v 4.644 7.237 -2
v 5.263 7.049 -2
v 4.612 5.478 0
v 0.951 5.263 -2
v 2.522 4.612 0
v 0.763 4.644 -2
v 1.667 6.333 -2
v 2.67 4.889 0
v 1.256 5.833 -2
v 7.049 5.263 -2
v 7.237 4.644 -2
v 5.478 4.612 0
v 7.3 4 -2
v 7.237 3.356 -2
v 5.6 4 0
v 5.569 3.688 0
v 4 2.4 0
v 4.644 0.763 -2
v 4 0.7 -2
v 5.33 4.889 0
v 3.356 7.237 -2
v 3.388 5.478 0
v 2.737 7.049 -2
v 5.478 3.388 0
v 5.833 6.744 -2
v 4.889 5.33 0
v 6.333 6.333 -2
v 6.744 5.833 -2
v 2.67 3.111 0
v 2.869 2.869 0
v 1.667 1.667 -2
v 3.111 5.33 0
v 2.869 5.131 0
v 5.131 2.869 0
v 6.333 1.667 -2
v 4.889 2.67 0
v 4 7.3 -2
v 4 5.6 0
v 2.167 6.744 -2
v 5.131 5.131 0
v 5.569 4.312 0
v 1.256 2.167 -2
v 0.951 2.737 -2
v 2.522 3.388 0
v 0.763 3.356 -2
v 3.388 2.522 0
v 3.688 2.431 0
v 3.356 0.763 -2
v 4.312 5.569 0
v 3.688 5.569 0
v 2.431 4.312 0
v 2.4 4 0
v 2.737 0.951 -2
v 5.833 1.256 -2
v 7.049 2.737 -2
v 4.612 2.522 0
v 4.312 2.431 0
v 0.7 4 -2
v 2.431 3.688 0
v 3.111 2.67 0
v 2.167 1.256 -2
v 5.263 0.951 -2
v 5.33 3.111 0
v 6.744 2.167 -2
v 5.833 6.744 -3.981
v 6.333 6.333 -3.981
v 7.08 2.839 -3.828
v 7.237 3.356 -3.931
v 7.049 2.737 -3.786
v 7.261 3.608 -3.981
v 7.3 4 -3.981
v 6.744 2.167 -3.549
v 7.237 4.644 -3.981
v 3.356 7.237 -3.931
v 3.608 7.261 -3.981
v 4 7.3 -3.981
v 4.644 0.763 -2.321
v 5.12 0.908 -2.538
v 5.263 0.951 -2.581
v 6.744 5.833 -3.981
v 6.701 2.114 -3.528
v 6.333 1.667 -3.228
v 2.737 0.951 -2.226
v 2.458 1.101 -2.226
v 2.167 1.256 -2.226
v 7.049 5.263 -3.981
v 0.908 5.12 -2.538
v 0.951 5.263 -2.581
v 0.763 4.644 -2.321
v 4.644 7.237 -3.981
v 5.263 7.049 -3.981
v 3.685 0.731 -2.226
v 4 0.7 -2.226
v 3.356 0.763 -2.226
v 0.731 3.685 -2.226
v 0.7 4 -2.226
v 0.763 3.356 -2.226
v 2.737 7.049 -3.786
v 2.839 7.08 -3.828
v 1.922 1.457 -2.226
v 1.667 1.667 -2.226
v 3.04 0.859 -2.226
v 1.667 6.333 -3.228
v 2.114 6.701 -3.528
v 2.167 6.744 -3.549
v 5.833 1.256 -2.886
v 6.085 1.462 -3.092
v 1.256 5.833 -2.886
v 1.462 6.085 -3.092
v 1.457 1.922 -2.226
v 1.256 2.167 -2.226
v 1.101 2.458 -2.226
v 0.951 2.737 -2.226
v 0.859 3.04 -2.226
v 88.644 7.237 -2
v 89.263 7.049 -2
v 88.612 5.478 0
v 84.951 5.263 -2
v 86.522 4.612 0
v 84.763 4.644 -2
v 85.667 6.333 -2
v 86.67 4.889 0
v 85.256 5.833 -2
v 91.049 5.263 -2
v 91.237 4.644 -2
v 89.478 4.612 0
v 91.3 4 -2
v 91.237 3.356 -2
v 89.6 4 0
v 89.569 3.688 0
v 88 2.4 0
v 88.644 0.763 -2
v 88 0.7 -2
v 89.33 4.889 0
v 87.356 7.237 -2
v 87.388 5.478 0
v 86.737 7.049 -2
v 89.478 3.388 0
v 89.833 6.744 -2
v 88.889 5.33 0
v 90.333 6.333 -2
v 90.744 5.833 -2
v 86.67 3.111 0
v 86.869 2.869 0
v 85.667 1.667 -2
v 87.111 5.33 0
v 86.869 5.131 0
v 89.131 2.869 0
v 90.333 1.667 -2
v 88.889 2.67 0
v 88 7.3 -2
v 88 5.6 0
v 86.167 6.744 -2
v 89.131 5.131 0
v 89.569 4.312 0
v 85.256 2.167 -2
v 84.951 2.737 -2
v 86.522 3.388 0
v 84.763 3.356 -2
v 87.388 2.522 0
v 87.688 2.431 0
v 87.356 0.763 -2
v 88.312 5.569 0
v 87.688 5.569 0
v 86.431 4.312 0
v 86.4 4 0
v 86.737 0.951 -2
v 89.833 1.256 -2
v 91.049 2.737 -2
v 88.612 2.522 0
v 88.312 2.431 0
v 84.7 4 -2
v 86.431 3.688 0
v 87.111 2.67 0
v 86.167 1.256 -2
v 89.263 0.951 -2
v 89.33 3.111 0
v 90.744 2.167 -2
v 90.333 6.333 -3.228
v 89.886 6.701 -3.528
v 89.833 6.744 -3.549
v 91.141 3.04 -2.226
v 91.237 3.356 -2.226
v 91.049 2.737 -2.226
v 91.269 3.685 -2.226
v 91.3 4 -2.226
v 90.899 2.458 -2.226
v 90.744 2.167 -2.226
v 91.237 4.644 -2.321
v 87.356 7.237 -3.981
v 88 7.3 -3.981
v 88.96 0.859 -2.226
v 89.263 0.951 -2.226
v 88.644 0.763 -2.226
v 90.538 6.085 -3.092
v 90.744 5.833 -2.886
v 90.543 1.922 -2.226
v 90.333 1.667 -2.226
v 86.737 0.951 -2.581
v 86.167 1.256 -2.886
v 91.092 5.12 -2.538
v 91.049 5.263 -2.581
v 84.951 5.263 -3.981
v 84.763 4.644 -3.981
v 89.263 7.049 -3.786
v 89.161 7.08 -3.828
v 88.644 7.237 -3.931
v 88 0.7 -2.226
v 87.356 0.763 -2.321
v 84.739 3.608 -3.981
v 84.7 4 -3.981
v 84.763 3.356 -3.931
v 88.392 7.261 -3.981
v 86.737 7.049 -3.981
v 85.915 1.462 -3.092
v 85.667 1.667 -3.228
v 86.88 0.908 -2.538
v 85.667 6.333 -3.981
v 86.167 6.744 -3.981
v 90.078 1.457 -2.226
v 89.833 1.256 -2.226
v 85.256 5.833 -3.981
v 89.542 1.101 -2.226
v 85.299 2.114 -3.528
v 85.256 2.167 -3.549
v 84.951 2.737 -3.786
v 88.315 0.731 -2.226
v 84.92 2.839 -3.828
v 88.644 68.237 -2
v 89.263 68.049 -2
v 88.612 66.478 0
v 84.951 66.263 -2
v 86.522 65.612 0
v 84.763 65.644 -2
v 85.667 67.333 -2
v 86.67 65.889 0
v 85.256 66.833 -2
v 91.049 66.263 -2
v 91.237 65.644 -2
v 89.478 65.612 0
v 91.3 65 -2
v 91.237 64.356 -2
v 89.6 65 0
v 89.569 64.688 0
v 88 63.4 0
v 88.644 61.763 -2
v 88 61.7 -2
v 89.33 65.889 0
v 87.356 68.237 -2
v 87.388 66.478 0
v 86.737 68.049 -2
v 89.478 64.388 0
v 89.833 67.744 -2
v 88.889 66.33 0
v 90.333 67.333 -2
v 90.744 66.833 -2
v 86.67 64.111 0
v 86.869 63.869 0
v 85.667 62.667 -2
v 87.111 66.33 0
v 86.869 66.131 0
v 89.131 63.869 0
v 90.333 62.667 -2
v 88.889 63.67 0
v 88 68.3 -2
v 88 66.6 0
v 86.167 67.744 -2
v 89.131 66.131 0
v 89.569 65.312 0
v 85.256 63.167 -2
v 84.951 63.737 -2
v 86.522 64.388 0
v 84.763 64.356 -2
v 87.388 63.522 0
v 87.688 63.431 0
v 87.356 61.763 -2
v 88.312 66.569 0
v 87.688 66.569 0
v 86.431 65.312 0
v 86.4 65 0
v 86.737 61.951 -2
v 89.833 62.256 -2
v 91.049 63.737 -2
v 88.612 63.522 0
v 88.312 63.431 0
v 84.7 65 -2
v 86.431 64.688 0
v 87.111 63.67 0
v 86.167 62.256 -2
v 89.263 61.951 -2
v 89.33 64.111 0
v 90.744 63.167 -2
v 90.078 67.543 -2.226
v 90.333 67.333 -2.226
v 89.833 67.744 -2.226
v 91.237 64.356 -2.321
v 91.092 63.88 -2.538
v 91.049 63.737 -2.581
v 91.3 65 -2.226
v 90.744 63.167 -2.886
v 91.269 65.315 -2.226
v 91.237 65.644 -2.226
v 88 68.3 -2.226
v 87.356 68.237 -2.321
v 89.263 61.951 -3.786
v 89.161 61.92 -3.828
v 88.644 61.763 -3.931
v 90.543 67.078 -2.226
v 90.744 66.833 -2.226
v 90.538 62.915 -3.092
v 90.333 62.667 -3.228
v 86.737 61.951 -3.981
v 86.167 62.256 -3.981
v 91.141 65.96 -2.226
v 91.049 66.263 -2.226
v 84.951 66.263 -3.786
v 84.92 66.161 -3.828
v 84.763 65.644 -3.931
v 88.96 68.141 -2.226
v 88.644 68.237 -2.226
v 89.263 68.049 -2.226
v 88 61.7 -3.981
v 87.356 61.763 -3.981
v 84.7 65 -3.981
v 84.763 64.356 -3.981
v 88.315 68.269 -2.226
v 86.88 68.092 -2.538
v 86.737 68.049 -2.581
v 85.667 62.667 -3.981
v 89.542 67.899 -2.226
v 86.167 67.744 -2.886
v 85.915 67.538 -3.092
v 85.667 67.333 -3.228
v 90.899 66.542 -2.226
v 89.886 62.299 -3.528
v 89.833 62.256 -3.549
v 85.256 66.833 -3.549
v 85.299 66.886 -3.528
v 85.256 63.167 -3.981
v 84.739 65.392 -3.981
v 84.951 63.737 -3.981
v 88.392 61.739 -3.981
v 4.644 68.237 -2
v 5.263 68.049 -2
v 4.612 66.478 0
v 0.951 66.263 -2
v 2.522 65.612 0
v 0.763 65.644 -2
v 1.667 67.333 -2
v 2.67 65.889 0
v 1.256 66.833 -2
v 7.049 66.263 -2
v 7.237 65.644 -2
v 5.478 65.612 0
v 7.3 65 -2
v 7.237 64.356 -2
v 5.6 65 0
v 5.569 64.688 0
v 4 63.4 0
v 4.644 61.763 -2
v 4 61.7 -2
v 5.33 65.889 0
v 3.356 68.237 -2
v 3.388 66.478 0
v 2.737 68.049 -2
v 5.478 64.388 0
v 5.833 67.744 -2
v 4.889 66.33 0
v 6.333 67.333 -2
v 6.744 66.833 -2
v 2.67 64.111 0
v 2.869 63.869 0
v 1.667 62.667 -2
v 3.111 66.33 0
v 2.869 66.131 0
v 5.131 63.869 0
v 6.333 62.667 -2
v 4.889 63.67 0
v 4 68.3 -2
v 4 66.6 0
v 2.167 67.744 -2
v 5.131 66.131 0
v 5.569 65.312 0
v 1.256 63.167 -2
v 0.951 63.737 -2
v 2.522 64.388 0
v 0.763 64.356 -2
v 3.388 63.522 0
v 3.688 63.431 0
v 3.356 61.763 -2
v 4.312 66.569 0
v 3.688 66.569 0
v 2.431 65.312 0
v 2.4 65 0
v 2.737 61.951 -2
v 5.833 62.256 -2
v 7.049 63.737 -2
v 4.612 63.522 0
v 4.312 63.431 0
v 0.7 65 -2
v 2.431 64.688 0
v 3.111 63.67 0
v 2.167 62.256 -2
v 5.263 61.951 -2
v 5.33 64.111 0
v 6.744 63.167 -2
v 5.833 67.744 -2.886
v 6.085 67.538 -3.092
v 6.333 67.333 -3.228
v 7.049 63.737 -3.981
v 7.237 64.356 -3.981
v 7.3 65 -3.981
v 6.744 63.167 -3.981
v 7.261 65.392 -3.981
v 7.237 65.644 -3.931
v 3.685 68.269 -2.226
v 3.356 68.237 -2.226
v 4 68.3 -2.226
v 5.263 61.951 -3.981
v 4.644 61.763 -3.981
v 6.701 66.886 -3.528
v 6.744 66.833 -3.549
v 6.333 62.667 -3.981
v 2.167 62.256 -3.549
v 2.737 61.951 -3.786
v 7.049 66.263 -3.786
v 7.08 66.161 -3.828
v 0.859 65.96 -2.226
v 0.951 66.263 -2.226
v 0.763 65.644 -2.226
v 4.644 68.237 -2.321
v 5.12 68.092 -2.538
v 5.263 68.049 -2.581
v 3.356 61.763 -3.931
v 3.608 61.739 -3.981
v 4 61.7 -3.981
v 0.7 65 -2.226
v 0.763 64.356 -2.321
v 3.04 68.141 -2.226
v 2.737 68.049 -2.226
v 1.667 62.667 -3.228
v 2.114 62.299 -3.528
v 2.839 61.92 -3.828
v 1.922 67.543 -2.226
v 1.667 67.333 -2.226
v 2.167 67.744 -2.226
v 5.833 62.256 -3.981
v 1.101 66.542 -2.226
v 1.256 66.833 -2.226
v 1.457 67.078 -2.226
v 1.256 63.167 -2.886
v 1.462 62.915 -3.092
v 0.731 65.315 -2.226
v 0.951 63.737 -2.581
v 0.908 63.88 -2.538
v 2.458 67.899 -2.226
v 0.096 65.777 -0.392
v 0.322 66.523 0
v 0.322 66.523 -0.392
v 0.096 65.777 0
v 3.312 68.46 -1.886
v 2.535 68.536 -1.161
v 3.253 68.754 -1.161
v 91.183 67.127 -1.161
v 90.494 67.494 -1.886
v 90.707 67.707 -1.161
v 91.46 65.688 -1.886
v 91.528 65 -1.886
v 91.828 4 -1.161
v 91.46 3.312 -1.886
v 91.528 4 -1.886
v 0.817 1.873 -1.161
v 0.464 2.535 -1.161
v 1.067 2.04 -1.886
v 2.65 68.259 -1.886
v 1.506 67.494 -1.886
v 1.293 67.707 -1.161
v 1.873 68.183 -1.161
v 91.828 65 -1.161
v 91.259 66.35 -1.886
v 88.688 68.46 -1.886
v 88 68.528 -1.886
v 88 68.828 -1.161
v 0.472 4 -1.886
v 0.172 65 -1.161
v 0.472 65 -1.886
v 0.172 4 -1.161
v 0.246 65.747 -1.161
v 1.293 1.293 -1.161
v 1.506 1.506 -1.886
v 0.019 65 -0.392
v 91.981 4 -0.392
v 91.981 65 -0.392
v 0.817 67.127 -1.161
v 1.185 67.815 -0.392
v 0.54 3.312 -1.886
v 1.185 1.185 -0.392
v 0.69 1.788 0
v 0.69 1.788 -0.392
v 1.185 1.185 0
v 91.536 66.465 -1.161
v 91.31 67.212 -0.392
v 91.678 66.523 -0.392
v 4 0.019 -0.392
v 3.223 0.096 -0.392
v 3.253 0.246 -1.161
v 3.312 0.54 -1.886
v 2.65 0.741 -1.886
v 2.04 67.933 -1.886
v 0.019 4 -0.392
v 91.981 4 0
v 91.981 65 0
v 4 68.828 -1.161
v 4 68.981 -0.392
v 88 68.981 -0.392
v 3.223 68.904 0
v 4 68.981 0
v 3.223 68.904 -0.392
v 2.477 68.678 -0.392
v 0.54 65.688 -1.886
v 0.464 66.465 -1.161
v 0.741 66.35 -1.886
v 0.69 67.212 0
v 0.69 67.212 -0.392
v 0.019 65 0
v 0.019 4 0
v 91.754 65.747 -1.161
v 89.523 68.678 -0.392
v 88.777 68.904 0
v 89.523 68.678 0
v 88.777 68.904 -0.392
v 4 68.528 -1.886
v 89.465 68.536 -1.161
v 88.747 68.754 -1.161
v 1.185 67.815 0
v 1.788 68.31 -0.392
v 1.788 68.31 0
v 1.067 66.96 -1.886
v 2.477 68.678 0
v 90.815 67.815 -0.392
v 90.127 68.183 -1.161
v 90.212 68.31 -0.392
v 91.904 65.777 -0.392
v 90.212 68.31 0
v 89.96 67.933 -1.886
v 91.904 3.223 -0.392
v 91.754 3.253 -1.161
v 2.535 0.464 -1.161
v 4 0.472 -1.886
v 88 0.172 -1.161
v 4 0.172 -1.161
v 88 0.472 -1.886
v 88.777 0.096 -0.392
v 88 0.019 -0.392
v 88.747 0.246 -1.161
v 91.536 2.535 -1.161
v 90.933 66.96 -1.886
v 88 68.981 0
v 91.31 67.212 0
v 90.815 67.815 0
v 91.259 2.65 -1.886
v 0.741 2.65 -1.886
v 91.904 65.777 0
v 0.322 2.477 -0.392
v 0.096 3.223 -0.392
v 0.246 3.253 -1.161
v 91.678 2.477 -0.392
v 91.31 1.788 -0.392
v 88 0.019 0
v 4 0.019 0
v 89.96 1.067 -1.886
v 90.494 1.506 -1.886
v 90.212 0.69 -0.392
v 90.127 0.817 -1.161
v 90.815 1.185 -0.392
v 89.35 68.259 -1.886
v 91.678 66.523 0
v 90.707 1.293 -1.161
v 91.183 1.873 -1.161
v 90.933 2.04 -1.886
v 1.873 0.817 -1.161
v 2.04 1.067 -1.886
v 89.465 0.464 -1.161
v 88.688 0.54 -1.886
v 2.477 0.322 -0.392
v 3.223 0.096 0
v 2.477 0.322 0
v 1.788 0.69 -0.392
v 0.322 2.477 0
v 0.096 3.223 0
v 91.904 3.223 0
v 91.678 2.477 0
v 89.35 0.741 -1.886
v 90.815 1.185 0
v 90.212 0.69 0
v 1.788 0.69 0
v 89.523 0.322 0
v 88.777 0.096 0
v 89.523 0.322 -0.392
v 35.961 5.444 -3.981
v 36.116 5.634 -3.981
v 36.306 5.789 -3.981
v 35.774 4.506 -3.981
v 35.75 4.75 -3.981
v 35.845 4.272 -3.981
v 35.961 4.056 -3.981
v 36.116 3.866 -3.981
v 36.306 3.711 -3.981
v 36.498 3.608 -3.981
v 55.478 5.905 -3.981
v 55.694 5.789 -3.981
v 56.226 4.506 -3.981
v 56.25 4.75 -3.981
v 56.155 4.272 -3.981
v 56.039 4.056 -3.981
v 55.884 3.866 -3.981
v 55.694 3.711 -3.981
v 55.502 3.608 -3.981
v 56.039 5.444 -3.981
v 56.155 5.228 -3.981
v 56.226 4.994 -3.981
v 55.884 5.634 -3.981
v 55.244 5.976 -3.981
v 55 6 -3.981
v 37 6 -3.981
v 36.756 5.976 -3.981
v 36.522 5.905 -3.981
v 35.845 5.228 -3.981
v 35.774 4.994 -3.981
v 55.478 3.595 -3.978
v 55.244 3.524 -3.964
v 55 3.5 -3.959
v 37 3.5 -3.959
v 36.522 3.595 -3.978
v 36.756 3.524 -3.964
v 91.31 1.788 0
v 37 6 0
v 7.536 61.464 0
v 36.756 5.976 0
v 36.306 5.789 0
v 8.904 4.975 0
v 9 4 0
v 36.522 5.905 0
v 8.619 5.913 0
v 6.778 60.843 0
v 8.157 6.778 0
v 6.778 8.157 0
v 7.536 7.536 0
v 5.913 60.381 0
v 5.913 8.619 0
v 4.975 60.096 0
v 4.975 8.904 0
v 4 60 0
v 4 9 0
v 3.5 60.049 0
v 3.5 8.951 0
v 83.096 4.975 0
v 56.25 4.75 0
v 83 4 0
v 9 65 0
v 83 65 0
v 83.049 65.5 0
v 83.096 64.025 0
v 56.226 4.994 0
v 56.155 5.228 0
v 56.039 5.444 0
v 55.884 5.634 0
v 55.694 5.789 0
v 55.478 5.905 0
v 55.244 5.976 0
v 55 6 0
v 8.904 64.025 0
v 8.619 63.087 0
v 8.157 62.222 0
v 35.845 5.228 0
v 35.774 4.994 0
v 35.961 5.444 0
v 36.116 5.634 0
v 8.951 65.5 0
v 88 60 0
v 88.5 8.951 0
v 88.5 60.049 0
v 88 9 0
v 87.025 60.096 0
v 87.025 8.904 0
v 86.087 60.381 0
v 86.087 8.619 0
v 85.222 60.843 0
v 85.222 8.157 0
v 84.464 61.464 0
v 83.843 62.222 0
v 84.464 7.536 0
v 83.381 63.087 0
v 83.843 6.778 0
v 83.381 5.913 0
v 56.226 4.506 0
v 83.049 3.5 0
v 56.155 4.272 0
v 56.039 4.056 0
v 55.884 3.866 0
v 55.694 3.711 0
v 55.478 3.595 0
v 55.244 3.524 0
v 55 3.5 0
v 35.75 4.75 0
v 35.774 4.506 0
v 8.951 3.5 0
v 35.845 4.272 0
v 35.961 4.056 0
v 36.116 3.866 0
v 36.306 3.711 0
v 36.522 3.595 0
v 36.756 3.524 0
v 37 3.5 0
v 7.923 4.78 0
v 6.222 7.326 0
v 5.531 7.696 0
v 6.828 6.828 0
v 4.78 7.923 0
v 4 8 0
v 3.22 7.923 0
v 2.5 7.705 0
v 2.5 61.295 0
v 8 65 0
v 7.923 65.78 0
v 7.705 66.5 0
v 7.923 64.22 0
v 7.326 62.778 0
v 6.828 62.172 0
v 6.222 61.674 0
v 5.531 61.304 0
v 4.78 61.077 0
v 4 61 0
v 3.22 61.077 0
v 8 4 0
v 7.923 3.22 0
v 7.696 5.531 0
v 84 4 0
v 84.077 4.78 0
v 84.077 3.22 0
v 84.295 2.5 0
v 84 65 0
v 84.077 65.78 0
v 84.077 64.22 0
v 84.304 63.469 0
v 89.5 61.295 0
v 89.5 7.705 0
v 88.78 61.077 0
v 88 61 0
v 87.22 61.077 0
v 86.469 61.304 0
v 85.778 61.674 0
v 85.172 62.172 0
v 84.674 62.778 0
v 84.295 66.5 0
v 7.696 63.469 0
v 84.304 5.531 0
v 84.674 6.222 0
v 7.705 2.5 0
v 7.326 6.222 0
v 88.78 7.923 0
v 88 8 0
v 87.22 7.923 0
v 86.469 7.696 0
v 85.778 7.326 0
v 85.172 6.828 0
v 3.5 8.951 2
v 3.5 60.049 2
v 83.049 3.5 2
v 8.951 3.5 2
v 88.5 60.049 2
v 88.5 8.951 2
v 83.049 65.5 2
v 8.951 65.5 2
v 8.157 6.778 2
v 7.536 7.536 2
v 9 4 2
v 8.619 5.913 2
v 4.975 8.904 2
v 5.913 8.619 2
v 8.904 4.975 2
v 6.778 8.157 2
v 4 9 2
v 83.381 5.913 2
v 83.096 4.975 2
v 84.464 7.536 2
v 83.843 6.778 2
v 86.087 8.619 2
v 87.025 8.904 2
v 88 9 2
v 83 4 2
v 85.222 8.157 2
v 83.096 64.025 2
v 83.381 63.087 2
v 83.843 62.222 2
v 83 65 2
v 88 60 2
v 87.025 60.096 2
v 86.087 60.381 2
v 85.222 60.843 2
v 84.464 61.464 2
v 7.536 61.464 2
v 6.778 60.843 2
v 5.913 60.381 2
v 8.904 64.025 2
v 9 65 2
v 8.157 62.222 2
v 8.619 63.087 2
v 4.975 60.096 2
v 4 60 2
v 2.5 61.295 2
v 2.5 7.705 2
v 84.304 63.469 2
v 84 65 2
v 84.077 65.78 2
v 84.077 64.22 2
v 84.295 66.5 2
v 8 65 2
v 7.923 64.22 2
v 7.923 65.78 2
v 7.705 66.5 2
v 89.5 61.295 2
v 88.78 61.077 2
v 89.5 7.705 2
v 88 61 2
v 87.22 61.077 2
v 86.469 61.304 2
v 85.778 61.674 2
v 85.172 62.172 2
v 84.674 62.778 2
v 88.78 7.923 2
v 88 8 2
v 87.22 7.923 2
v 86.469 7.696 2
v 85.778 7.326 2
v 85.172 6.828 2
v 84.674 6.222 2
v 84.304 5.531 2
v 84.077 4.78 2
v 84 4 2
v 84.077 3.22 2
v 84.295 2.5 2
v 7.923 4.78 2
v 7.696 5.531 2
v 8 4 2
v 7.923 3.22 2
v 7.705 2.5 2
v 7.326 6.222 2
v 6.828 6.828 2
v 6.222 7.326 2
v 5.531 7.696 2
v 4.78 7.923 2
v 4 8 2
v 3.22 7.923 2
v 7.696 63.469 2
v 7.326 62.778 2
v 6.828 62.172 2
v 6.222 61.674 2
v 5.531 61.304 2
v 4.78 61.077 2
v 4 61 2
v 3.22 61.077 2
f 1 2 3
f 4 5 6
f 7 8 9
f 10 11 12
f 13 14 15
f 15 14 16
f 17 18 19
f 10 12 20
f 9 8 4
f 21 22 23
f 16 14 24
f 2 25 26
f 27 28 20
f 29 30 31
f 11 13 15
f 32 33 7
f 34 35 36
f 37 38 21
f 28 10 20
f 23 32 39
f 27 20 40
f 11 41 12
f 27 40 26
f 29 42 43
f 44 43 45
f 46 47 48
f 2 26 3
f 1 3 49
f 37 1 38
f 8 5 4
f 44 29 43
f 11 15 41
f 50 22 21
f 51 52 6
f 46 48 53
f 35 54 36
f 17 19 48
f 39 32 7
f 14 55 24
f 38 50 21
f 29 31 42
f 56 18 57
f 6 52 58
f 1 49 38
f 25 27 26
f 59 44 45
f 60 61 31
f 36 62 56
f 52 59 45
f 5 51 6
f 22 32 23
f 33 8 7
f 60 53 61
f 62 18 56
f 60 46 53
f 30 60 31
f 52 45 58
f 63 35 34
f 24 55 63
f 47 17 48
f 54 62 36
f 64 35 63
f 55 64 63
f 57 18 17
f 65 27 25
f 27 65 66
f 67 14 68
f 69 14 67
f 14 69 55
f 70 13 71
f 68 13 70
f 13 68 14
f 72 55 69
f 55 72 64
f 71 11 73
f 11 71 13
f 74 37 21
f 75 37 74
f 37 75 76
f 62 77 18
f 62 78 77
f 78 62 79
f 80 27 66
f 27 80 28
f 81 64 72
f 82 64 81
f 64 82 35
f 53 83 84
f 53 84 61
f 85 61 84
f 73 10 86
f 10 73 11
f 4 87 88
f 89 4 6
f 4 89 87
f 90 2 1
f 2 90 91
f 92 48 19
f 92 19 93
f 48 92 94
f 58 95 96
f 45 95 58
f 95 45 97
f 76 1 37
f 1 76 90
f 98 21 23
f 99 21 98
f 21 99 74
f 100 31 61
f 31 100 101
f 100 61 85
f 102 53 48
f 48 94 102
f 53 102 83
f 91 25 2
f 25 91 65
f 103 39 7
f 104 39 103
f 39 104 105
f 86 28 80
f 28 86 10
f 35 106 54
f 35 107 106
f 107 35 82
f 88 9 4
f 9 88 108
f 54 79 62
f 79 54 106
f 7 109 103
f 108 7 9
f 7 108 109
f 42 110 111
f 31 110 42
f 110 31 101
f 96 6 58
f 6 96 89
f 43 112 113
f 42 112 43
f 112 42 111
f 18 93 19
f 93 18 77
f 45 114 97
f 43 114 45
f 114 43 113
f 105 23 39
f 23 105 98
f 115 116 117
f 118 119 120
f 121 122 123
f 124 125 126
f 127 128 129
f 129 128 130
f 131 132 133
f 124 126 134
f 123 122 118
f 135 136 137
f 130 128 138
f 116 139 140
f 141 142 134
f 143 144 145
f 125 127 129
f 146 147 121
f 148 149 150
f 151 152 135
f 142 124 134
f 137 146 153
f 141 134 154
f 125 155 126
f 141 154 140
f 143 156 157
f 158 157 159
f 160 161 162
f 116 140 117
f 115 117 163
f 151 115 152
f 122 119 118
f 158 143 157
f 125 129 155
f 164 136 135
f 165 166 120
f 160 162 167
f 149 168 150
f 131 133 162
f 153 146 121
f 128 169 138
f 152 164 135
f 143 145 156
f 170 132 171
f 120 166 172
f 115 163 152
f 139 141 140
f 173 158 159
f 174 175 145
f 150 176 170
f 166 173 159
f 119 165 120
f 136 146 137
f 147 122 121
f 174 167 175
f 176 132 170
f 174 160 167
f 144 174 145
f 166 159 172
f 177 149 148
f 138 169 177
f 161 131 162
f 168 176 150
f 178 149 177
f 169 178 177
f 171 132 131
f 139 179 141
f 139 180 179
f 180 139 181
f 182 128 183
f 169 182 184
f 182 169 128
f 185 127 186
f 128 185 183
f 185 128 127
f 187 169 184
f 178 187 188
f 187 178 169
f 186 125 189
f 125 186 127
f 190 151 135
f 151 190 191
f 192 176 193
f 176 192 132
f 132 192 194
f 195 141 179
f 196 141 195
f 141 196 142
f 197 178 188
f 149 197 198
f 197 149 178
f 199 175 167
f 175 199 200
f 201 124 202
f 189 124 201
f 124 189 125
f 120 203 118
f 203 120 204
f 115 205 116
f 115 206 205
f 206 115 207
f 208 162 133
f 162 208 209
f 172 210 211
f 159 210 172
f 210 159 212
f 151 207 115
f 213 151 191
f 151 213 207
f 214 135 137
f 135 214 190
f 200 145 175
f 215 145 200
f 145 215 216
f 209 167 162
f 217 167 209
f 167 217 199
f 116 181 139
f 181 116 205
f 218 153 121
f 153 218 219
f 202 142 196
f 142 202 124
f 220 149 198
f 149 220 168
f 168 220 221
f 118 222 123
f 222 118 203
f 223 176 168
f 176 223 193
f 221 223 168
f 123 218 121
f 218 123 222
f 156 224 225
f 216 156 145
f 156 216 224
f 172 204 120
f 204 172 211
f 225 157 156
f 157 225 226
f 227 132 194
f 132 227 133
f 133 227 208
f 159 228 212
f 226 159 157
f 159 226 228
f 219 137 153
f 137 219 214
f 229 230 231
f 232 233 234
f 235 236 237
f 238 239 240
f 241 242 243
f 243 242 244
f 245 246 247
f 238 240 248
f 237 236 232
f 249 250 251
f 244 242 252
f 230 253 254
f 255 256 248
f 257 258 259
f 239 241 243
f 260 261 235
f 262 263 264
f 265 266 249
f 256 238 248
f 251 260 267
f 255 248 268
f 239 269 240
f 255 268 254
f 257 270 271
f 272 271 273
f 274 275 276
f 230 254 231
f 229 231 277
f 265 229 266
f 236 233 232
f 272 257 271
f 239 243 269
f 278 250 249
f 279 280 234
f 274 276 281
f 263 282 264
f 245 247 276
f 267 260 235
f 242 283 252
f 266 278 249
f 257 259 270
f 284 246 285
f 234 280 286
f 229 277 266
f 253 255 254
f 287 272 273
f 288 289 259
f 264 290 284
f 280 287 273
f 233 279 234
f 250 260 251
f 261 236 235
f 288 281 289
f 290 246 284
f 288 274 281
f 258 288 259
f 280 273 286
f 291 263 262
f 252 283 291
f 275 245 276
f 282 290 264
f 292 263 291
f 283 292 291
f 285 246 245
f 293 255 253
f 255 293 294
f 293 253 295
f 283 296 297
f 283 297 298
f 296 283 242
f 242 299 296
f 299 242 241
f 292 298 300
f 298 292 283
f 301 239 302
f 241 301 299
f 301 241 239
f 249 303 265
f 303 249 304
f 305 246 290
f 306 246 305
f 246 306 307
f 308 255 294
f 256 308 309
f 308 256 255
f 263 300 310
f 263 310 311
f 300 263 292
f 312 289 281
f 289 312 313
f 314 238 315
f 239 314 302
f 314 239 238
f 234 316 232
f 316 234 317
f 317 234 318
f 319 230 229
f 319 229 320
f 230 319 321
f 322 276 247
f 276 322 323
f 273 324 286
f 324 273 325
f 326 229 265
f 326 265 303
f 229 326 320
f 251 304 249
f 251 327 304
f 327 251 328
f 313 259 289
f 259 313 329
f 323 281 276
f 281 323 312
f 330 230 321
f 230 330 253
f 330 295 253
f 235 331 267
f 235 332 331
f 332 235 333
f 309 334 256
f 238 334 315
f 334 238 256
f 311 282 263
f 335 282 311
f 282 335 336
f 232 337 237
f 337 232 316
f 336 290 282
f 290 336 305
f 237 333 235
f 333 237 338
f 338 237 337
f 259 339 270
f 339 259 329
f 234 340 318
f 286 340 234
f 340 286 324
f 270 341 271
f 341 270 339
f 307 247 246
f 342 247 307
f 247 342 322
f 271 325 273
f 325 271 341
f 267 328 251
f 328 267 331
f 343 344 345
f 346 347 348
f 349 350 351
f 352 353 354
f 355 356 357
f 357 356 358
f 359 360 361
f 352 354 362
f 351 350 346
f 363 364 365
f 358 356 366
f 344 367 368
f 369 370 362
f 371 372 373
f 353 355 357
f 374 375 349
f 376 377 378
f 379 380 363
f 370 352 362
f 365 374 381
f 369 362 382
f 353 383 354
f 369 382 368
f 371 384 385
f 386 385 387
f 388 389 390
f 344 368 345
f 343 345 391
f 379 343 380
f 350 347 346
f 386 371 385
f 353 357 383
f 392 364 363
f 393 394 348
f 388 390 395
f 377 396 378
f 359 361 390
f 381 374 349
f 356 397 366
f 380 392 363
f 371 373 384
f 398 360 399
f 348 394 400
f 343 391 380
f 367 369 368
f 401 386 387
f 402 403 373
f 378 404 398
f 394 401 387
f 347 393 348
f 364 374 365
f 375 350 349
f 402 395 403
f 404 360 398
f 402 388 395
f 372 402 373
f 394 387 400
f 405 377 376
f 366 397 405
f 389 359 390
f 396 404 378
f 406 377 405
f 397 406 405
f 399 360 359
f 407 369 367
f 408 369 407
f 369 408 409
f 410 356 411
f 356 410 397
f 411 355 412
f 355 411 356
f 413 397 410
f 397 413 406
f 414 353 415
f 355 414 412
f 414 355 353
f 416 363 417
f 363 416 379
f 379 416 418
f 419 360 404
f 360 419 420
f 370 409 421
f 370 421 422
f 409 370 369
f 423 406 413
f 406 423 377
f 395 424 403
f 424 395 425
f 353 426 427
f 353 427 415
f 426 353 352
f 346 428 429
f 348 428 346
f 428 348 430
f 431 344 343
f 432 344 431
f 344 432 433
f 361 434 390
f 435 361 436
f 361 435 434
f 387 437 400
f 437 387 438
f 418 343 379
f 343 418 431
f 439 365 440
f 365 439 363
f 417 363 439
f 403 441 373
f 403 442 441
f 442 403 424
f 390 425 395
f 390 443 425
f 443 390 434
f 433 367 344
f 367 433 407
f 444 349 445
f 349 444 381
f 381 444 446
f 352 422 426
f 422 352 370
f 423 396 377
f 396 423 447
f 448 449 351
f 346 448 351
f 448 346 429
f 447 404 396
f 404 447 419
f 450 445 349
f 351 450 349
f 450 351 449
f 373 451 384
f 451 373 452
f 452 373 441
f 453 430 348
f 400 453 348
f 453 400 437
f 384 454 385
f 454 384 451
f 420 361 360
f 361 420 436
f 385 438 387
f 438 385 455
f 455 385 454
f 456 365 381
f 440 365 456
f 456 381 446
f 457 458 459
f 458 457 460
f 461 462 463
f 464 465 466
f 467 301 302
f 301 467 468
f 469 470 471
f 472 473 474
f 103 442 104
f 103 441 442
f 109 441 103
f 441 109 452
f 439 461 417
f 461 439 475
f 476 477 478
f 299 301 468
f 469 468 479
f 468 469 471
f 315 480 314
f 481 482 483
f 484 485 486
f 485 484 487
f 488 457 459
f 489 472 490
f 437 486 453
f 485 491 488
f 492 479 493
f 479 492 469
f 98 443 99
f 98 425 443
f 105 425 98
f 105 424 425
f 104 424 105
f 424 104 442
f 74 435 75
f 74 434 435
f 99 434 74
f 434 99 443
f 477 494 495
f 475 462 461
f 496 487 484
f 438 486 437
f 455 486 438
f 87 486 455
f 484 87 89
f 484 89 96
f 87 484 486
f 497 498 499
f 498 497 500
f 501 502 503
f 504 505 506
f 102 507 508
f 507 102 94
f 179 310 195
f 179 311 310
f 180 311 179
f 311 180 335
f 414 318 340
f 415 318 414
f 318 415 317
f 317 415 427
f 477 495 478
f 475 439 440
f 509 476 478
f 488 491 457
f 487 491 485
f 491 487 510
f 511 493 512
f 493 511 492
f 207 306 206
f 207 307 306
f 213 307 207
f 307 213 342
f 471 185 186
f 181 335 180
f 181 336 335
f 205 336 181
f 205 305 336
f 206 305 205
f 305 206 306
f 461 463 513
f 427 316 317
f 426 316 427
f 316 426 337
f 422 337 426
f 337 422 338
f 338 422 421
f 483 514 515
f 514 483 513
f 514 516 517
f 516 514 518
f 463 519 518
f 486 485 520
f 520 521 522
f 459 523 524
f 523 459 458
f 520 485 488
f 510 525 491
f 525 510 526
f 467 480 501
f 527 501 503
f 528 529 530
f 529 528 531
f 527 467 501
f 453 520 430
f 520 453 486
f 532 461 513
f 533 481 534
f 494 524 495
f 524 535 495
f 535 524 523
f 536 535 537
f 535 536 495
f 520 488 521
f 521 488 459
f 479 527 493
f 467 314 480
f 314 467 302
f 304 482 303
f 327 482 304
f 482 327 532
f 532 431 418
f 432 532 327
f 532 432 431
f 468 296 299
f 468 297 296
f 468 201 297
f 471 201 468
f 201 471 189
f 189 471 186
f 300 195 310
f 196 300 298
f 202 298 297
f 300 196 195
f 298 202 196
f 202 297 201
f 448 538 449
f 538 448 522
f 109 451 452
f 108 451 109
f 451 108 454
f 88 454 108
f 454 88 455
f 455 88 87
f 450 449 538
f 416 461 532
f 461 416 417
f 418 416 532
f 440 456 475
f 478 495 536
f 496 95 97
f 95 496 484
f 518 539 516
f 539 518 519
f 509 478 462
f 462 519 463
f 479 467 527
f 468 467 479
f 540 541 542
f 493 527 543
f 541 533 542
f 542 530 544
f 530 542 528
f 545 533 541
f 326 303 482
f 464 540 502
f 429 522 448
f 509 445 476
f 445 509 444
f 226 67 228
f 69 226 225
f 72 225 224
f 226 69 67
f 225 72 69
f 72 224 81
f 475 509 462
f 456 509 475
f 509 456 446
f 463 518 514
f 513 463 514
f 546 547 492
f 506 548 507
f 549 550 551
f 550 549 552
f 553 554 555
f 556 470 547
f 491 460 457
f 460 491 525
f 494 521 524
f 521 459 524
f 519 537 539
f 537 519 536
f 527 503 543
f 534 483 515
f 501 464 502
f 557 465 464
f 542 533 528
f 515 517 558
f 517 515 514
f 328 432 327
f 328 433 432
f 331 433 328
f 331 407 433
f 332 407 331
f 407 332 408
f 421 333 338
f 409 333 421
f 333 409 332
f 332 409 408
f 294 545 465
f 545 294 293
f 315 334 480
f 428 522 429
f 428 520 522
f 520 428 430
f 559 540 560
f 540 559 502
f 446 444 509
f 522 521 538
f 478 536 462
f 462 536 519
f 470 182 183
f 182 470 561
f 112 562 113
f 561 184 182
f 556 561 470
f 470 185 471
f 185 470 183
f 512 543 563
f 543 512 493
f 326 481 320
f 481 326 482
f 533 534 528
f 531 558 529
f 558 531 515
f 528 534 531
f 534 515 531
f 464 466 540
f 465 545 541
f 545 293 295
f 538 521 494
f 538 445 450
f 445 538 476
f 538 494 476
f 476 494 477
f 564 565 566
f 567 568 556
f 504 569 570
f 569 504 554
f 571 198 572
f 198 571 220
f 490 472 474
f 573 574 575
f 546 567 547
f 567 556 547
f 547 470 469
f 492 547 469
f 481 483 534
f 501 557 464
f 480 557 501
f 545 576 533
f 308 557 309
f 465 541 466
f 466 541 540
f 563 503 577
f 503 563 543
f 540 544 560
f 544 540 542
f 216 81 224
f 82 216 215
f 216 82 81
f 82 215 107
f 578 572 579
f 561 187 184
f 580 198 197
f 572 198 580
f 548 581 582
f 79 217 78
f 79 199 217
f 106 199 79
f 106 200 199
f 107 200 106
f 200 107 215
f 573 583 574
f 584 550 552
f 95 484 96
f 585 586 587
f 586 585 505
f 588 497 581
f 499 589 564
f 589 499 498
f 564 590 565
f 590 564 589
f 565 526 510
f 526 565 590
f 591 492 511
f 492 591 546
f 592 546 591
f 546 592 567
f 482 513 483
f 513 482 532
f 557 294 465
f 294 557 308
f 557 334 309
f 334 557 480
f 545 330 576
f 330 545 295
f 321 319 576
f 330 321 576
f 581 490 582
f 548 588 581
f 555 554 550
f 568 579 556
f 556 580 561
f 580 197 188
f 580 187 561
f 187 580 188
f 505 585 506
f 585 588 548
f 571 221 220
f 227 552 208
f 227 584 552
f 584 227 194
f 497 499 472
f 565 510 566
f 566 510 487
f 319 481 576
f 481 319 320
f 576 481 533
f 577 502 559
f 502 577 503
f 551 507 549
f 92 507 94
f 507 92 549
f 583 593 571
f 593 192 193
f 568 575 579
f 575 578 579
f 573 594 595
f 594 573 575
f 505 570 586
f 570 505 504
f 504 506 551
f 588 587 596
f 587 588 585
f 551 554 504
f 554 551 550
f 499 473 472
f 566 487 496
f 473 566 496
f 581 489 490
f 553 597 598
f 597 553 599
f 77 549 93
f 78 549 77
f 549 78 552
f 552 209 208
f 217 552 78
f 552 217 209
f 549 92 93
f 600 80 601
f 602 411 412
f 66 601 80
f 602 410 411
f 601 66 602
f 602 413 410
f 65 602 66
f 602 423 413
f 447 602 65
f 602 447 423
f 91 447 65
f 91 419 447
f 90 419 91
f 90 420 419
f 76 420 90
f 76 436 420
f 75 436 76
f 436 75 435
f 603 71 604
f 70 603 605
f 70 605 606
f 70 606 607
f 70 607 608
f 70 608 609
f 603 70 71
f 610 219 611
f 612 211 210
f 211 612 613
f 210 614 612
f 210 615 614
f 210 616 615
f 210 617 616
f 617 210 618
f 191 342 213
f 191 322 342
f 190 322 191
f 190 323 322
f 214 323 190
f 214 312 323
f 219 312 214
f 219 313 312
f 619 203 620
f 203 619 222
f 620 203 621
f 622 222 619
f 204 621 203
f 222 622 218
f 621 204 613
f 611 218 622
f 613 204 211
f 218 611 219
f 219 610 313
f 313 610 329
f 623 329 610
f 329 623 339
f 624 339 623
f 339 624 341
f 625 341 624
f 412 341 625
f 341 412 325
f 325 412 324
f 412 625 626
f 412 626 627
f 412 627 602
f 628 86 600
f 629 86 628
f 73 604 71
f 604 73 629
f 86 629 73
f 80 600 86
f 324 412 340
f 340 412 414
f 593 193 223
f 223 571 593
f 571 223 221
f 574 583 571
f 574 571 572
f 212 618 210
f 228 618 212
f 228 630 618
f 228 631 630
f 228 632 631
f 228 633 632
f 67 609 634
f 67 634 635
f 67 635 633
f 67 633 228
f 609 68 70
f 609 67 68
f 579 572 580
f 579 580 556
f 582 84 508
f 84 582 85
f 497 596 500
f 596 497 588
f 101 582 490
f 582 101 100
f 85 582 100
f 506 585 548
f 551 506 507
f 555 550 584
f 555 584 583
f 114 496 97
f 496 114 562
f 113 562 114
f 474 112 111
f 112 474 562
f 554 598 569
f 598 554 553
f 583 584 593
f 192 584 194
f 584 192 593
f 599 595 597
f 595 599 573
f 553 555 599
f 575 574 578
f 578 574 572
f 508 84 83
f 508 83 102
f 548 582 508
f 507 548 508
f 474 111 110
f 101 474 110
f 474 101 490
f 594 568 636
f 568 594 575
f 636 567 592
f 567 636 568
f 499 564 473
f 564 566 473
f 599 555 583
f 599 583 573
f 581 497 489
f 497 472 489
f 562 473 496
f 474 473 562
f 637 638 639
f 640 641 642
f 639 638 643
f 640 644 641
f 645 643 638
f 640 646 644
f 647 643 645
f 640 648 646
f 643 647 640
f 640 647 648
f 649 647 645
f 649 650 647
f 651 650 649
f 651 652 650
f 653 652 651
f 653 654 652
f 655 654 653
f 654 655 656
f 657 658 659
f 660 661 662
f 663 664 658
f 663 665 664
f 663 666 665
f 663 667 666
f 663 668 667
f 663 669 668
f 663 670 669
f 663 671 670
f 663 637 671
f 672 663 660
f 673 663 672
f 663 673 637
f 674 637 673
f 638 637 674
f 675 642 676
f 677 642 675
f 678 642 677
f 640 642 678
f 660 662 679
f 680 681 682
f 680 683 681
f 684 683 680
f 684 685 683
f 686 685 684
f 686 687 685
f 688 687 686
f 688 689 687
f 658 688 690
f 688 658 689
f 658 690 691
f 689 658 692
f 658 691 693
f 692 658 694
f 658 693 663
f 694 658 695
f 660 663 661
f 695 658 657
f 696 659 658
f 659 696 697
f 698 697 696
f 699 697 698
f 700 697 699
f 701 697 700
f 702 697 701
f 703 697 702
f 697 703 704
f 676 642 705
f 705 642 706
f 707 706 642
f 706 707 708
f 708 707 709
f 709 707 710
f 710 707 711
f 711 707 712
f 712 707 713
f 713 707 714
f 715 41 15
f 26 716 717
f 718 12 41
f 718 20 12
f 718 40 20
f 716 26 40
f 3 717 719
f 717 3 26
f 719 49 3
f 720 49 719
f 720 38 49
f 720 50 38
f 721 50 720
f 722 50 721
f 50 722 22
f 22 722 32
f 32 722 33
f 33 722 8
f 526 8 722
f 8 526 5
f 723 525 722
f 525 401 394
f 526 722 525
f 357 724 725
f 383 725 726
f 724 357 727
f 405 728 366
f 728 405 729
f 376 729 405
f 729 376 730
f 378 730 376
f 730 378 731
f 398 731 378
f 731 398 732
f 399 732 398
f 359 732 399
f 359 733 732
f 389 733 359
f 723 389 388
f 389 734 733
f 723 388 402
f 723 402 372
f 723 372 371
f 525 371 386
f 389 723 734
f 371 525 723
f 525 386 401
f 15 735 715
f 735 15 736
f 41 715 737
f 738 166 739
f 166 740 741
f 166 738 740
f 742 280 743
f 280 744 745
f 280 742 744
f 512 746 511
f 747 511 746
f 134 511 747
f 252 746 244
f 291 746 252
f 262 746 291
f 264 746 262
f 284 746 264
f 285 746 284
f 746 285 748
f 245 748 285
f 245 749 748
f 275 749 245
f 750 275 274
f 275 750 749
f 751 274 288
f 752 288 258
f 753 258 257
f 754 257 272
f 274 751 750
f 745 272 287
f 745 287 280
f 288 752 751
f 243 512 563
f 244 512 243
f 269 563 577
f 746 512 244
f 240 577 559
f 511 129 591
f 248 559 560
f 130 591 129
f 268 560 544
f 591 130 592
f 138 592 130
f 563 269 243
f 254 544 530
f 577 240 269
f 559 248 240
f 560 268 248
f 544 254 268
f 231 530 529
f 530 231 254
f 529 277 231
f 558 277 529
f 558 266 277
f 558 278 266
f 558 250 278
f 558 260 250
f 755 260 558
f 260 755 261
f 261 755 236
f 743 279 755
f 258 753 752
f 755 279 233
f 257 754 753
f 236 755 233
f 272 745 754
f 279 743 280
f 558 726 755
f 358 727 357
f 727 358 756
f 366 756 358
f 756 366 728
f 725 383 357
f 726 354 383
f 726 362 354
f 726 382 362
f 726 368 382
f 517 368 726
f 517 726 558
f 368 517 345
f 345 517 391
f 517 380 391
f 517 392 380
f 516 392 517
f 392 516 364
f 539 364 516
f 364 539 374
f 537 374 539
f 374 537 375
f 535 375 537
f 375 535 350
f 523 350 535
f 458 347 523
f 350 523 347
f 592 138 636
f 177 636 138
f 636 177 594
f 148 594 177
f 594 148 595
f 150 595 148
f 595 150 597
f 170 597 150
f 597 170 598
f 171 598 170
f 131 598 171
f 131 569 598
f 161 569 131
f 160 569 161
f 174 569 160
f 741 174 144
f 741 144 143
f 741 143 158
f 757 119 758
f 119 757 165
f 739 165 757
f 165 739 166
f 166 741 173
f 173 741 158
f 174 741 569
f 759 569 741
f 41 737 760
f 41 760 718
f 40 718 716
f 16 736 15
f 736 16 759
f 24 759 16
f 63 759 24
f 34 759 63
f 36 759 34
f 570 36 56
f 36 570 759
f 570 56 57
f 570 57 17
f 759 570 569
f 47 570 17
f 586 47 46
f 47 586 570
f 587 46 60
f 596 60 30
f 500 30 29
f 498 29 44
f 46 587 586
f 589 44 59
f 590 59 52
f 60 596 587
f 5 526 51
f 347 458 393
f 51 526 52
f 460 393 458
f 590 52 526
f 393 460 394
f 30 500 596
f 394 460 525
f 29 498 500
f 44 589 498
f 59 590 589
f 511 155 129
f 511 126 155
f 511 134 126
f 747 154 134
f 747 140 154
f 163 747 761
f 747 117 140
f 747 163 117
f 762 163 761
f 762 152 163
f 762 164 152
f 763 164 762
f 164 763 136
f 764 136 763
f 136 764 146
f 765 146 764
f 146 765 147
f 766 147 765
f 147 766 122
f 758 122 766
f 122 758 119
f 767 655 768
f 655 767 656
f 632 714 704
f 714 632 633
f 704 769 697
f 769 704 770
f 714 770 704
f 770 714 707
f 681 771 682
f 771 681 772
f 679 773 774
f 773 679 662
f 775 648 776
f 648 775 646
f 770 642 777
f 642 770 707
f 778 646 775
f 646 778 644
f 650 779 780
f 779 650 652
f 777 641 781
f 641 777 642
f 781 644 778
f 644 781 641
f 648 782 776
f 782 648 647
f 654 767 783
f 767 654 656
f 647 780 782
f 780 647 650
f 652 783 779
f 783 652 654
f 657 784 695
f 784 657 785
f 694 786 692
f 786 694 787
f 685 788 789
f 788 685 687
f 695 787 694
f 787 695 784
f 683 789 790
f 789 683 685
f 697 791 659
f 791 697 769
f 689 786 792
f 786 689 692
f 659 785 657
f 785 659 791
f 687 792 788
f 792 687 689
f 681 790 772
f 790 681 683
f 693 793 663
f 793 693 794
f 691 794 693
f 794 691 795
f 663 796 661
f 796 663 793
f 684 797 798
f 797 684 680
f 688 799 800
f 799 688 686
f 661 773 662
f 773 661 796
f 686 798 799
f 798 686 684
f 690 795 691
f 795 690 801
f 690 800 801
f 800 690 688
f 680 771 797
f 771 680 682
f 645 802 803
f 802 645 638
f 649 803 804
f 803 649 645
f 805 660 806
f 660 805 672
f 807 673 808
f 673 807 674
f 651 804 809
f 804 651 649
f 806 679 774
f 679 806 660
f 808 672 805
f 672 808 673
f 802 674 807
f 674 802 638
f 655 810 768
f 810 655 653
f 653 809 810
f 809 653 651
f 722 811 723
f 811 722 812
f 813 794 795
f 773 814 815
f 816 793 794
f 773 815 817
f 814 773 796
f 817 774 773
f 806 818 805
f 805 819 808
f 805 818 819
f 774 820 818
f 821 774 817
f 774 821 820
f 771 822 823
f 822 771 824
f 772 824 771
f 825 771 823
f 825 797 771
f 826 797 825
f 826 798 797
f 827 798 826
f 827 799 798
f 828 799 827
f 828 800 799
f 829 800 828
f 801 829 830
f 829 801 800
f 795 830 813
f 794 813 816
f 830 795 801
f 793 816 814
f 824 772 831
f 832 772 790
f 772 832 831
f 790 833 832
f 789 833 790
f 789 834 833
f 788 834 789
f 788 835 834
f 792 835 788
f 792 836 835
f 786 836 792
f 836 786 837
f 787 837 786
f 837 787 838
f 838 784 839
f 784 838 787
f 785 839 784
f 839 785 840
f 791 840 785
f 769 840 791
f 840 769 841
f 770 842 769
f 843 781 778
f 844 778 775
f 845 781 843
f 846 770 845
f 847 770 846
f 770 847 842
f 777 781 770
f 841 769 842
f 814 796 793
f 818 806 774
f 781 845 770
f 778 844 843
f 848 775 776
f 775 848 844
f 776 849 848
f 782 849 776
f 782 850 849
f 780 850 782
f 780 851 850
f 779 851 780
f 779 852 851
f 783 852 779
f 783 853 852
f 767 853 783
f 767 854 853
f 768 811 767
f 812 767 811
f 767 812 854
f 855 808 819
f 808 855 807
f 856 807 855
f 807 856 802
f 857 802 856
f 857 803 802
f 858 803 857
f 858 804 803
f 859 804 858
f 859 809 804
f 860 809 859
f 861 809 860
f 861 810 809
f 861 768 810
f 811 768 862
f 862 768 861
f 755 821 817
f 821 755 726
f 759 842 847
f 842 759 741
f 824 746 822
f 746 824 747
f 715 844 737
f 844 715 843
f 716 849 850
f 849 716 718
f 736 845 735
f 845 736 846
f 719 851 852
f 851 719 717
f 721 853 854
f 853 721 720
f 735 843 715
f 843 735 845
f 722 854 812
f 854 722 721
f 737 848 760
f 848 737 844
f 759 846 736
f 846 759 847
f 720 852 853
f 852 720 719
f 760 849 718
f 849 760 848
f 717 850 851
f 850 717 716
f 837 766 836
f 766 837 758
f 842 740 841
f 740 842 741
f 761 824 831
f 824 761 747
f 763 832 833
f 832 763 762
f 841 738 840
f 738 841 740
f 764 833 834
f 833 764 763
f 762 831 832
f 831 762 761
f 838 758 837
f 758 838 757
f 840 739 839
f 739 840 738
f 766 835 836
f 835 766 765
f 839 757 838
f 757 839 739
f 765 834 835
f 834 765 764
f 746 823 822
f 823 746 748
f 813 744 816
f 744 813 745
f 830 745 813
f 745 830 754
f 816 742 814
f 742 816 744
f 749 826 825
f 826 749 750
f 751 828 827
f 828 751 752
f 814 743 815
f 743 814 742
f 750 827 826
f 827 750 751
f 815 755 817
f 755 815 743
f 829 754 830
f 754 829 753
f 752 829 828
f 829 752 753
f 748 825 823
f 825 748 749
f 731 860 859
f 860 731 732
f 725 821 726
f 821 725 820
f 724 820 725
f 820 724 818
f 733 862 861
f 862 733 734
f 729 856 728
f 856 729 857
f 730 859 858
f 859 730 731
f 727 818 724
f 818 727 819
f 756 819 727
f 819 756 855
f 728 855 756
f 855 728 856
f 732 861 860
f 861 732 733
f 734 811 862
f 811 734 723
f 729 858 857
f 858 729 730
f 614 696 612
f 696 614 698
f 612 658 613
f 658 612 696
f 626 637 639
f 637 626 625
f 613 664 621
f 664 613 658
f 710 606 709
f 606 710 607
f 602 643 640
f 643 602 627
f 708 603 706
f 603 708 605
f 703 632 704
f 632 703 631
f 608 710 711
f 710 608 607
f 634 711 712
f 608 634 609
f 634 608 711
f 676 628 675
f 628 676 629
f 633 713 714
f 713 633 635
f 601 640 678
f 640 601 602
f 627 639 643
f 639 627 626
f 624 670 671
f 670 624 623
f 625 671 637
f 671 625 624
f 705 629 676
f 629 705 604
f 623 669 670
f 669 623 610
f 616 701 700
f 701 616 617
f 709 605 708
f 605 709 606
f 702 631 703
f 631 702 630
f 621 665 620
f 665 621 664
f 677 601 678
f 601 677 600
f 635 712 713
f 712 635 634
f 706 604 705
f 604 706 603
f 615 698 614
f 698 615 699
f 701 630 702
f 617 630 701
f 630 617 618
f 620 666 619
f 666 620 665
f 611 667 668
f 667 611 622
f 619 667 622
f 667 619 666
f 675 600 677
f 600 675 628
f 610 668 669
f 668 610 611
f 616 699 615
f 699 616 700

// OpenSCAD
// file: ../lib/m3screw.scad
/**
 * Martin Egli
 * 2021-11-01
 * M3 screw cut outs
 */

module m3ScrewCut(len = 10, loc_res = 32) {
    translate([0, 0, 0])
    cylinder(d = 3.2, h = len, $fn = loc_res);
}

module m3SinkHeadCut(len = 4, loc_res = 32) {
    translate([0, 0, 0])
    cylinder(d1 = 3.2, d2 = 6.6, h = 2, $fn = loc_res);
    translate([0, 0, 2])
    cylinder(d = 6.6, h = len, $fn = loc_res);
}
module m3CylinderHeadCut(len = 4, loc_res = 32) {
    translate([0, 0, 0])
    cylinder(d = 6, h = len, $fn = loc_res);
}

module m3ScrewSinkHeadCut(len = 4, loc_res = 32) {
    translate([0, 0, 0])
    m3ScrewCut(len, loc_res);
    translate([0, 0, len])
    m3SinkHeadCut(len, loc_res);
}

module m3NutCut() {
    translate([0, 0, 0])
    cylinder(d = 6.6, h = 4, $fn = 6);
}

module m3SinkHeadScewNutCut(len = 10, loc_res = 32) {
    translate([0, 0, len])
    m3SinkHeadCut(4, loc_res);
    m3ScrewCut(len+1, loc_res);
    m3NutCut();
}

module m3CylinderHeadScewNutCut(len = 10, loc_res = 32) {
    translate([0, 0, len])
    m3CylinderHeadCut(4, loc_res);
    m3ScrewCut(len+1, loc_res);
    m3NutCut();
}

//m3SinkHeadScewNutCut(20);
//m3CylinderHeadScewNutCut(15);
m3ScrewSinkHeadCut(10);
// main file
/**
 * Martin Egli
 * 2021-12-01
 * see: https://de.aliexpress.com/item/32683969234.html
 */

use <../lib/m3screw.scad>

module dps3005(loc_res = 32) {
        color("DarkGray") {
        translate([0, 0, 0])
        cube([72, 39, 37]);
        translate([-(79-72)/2, -(43-39)/2, 34])
        cube([79, 43, 3]);
        translate([60, 22, 37])
        cylinder(d = 10, h = 11, $fn = loc_res);
    }
}

module dps3005_Cut(loc_res = 32) {
    translate([0, 0, 0])
    cube([72, 39, 37]);
    translate([-2, 13, 0])
    cube([76, 13, 35]);
}

module jack(col = "Black", jack_dia = 6, loc_res = 32) {
    color(col)
    translate([0, 0, 0])
    cylinder(d = jack_dia + 2, h = 3, $fn = loc_res);
    color("Silver")
    translate([0, 0, -10])
    cylinder(d = jack_dia, h = 13.1, $fn = loc_res);
}

module jack_Cut(jack_dia = 6, loc_res = 32) {
    translate([0, 0, -10])
    cylinder(d = jack_dia, h = 13.1, $fn = loc_res);
}


module caseFront(show_elements = 1, loc_res = 32) {
    if(show_elements) {
        translate([10, 20, 0])
        dps3005();
        translate([1*72/8+10, 10, 34])
        jack("Black");
        translate([3*72/8+10, 10, 34])
        jack("Red");
        translate([5*72/8+10, 10, 34])
        jack("Black");
        translate([7*72/8+10, 10, 34])
        jack("Red");
        
    }
    
    edge_rad = 4;
    wall_th = 2.5;
    thread_dia = 2.5;
    xlen = 72+2*10;
    ylen = 39+10+20;
    xpos1 = edge_rad;
    ypos1 = edge_rad;
    xpos2 = xlen-edge_rad;
    ypos2 = ylen-edge_rad;
    difference() {
        hull() {
            translate([xpos1, ypos1, 0]) {
                translate([0, 0, 0])
                cylinder(r = edge_rad, h = 1, $fn = loc_res);
                translate([0, 0, 35-edge_rad])
                sphere(r = edge_rad, $fn = loc_res);
            }
            translate([xpos2, ypos1, 0]) {
                translate([0, 0, 0])
                cylinder(r = edge_rad, h = 1, $fn = loc_res);
                translate([0, 0, 35-edge_rad])
                sphere(r = edge_rad, $fn = loc_res);
            }
            translate([xpos2, ypos2, 0]) {
                translate([0, 0, 0])
                cylinder(r = edge_rad, h = 1, $fn = loc_res);
                translate([0, 0, 35-edge_rad])
                sphere(r = edge_rad, $fn = loc_res);
            }
            translate([xpos1, ypos2, 0]) {
                translate([0, 0, 0])
                cylinder(r = edge_rad, h = 1, $fn = loc_res);
                translate([0, 0, 35-edge_rad])
                sphere(r = edge_rad, $fn = loc_res);
            }
        }
        
        // elements
        translate([10, 20, 0])
        dps3005_Cut();
        translate([1*72/8+10, 10, 35])
        jack_Cut();
        translate([3*72/8+10, 10, 35])
        jack_Cut();
        translate([5*72/8+10, 10, 35])
        jack_Cut();
        translate([7*72/8+10, 10, 35])
        jack_Cut();
        // text
        translate([1*72/8+14, 8, 34.5])
        linear_extrude(1)
        text("12V", size = 4);
        translate([5*72/8+15.5, 8, 34.5])
        linear_extrude(1)
        text("adj", size = 4);
            
        difference() {
            hull() {
                translate([wall_th, wall_th, -1]) {
                    cube([xlen-2*wall_th, ylen-2*wall_th, 34-wall_th]);
                    translate([2, 2, ])
                    cube([xlen-2*wall_th-4, ylen-2*wall_th-4, 34-wall_th+2]);
                }
            }
            translate([xpos1, ypos1, -2])
            cylinder(r = edge_rad, h = 34+4, $fn = loc_res);
            translate([xpos2, ypos1, -2])
            cylinder(r = edge_rad, h = 34+4, $fn = loc_res);
            translate([xpos2, ypos2, -2])
            cylinder(r = edge_rad, h = 34+4, $fn = loc_res);
            translate([xpos1, ypos2, -2])
            cylinder(r = edge_rad, h = 34+4, $fn = loc_res);
        }
        translate([xpos1, ypos1, -2])
        cylinder(d = thread_dia, h = 20, $fn = loc_res);
        translate([xpos2, ypos1, -2])
        cylinder(d = thread_dia, h = 20, $fn = loc_res);
        translate([xpos2, ypos2, -2])
        cylinder(d = thread_dia, h = 20, $fn = loc_res);
        translate([xpos1, ypos2, -2])
        cylinder(d = thread_dia, h = 20, $fn = loc_res);
    }
}

module caseBack(show_elements = 1, loc_res = 32) {
    if(show_elements) {
        
    }
    
    edge_rad = 4;
    wall_th = 2.5;
    thread_dia = 2.5;
    xlen = 72+2*10;
    ylen = 39+10+20;
    xpos1 = edge_rad;
    ypos1 = edge_rad;
    xpos2 = xlen-edge_rad;
    ypos2 = ylen-edge_rad;
    difference() {
            union() {
            difference() {
                hull() {
                    translate([xpos1, ypos1, 0]) {
                        sphere(r = edge_rad, $fn = loc_res);
                    }
                    translate([xpos2, ypos1, 0]) {
                        sphere(r = edge_rad, $fn = loc_res);
                    }
                    translate([xpos2, ypos2, 0]) {
                        sphere(r = edge_rad, $fn = loc_res);
                    }
                    translate([xpos1, ypos2, 0]) {
                        sphere(r = edge_rad, $fn = loc_res);
                    }
                }
                translate([-1, -1, 0])
                cube([xlen+2, ylen+2, edge_rad+1]);
                
                translate([xpos1, ypos1, 10])
                rotate([180, 0, 0])
                m3SinkHeadScewNutCut(10);
                translate([xpos2, ypos1, 10])
                rotate([180, 0, 0])
                m3SinkHeadScewNutCut(10);
                translate([xpos2, ypos2, 10])
                rotate([180, 0, 0])
                m3SinkHeadScewNutCut(10);
                translate([xpos1, ypos2, 10])
                rotate([180, 0, 0])
                m3SinkHeadScewNutCut(10);
            }
            difference() {
                hull() {
                    translate([wall_th, wall_th, 0]) {
                        cube([xlen-2*wall_th, ylen-2*wall_th, 2]);
                    }
                }
                translate([xpos1, ypos1, -2])
                cylinder(r = edge_rad, h = 6, $fn = loc_res);
                translate([xpos2, ypos1, -2])
                cylinder(r = edge_rad, h = 6, $fn = loc_res);
                translate([xpos2, ypos2, -2])
                cylinder(r = edge_rad, h = 6, $fn = loc_res);
                translate([xpos1, ypos2, -2])
                cylinder(r = edge_rad, h = 6, $fn = loc_res);
                difference() {
                    hull() {
                        translate([wall_th+1, wall_th+1, -1]) {
                            cube([xlen-2*wall_th-2, ylen-2*wall_th-2, 4]);
                        }
                    }
                    translate([xpos1, ypos1, -2])
                    cylinder(r = edge_rad+1, h = 6, $fn = loc_res);
                    translate([xpos2, ypos1, -2])
                    cylinder(r = edge_rad+1, h = 6, $fn = loc_res);
                    translate([xpos2, ypos2, -2])
                    cylinder(r = edge_rad+1, h = 6, $fn = loc_res);
                    translate([xpos1, ypos2, -2])
                    cylinder(r = edge_rad+1, h = 6, $fn = loc_res);
                }
            }
        }
        /*hull() {
            translate([xlen/2, 0, -5])
            cylinder(d = 8, h = 10, $fn = loc_res);
            translate([xlen/2, 6, -5])
            cylinder(d = 8, h = 10, $fn = loc_res);
        }*/
        hull() {
            translate([xlen/2-9, 4.75, -5])
            cylinder(d = 2.5, h = 10, $fn = loc_res);
            translate([xlen/2+9, 4.75, -5])
            cylinder(d = 2.5, h = 10, $fn = loc_res);
        }
    }
}
//caseFront(0);

//translate([0, 0, -20])
caseBack();
